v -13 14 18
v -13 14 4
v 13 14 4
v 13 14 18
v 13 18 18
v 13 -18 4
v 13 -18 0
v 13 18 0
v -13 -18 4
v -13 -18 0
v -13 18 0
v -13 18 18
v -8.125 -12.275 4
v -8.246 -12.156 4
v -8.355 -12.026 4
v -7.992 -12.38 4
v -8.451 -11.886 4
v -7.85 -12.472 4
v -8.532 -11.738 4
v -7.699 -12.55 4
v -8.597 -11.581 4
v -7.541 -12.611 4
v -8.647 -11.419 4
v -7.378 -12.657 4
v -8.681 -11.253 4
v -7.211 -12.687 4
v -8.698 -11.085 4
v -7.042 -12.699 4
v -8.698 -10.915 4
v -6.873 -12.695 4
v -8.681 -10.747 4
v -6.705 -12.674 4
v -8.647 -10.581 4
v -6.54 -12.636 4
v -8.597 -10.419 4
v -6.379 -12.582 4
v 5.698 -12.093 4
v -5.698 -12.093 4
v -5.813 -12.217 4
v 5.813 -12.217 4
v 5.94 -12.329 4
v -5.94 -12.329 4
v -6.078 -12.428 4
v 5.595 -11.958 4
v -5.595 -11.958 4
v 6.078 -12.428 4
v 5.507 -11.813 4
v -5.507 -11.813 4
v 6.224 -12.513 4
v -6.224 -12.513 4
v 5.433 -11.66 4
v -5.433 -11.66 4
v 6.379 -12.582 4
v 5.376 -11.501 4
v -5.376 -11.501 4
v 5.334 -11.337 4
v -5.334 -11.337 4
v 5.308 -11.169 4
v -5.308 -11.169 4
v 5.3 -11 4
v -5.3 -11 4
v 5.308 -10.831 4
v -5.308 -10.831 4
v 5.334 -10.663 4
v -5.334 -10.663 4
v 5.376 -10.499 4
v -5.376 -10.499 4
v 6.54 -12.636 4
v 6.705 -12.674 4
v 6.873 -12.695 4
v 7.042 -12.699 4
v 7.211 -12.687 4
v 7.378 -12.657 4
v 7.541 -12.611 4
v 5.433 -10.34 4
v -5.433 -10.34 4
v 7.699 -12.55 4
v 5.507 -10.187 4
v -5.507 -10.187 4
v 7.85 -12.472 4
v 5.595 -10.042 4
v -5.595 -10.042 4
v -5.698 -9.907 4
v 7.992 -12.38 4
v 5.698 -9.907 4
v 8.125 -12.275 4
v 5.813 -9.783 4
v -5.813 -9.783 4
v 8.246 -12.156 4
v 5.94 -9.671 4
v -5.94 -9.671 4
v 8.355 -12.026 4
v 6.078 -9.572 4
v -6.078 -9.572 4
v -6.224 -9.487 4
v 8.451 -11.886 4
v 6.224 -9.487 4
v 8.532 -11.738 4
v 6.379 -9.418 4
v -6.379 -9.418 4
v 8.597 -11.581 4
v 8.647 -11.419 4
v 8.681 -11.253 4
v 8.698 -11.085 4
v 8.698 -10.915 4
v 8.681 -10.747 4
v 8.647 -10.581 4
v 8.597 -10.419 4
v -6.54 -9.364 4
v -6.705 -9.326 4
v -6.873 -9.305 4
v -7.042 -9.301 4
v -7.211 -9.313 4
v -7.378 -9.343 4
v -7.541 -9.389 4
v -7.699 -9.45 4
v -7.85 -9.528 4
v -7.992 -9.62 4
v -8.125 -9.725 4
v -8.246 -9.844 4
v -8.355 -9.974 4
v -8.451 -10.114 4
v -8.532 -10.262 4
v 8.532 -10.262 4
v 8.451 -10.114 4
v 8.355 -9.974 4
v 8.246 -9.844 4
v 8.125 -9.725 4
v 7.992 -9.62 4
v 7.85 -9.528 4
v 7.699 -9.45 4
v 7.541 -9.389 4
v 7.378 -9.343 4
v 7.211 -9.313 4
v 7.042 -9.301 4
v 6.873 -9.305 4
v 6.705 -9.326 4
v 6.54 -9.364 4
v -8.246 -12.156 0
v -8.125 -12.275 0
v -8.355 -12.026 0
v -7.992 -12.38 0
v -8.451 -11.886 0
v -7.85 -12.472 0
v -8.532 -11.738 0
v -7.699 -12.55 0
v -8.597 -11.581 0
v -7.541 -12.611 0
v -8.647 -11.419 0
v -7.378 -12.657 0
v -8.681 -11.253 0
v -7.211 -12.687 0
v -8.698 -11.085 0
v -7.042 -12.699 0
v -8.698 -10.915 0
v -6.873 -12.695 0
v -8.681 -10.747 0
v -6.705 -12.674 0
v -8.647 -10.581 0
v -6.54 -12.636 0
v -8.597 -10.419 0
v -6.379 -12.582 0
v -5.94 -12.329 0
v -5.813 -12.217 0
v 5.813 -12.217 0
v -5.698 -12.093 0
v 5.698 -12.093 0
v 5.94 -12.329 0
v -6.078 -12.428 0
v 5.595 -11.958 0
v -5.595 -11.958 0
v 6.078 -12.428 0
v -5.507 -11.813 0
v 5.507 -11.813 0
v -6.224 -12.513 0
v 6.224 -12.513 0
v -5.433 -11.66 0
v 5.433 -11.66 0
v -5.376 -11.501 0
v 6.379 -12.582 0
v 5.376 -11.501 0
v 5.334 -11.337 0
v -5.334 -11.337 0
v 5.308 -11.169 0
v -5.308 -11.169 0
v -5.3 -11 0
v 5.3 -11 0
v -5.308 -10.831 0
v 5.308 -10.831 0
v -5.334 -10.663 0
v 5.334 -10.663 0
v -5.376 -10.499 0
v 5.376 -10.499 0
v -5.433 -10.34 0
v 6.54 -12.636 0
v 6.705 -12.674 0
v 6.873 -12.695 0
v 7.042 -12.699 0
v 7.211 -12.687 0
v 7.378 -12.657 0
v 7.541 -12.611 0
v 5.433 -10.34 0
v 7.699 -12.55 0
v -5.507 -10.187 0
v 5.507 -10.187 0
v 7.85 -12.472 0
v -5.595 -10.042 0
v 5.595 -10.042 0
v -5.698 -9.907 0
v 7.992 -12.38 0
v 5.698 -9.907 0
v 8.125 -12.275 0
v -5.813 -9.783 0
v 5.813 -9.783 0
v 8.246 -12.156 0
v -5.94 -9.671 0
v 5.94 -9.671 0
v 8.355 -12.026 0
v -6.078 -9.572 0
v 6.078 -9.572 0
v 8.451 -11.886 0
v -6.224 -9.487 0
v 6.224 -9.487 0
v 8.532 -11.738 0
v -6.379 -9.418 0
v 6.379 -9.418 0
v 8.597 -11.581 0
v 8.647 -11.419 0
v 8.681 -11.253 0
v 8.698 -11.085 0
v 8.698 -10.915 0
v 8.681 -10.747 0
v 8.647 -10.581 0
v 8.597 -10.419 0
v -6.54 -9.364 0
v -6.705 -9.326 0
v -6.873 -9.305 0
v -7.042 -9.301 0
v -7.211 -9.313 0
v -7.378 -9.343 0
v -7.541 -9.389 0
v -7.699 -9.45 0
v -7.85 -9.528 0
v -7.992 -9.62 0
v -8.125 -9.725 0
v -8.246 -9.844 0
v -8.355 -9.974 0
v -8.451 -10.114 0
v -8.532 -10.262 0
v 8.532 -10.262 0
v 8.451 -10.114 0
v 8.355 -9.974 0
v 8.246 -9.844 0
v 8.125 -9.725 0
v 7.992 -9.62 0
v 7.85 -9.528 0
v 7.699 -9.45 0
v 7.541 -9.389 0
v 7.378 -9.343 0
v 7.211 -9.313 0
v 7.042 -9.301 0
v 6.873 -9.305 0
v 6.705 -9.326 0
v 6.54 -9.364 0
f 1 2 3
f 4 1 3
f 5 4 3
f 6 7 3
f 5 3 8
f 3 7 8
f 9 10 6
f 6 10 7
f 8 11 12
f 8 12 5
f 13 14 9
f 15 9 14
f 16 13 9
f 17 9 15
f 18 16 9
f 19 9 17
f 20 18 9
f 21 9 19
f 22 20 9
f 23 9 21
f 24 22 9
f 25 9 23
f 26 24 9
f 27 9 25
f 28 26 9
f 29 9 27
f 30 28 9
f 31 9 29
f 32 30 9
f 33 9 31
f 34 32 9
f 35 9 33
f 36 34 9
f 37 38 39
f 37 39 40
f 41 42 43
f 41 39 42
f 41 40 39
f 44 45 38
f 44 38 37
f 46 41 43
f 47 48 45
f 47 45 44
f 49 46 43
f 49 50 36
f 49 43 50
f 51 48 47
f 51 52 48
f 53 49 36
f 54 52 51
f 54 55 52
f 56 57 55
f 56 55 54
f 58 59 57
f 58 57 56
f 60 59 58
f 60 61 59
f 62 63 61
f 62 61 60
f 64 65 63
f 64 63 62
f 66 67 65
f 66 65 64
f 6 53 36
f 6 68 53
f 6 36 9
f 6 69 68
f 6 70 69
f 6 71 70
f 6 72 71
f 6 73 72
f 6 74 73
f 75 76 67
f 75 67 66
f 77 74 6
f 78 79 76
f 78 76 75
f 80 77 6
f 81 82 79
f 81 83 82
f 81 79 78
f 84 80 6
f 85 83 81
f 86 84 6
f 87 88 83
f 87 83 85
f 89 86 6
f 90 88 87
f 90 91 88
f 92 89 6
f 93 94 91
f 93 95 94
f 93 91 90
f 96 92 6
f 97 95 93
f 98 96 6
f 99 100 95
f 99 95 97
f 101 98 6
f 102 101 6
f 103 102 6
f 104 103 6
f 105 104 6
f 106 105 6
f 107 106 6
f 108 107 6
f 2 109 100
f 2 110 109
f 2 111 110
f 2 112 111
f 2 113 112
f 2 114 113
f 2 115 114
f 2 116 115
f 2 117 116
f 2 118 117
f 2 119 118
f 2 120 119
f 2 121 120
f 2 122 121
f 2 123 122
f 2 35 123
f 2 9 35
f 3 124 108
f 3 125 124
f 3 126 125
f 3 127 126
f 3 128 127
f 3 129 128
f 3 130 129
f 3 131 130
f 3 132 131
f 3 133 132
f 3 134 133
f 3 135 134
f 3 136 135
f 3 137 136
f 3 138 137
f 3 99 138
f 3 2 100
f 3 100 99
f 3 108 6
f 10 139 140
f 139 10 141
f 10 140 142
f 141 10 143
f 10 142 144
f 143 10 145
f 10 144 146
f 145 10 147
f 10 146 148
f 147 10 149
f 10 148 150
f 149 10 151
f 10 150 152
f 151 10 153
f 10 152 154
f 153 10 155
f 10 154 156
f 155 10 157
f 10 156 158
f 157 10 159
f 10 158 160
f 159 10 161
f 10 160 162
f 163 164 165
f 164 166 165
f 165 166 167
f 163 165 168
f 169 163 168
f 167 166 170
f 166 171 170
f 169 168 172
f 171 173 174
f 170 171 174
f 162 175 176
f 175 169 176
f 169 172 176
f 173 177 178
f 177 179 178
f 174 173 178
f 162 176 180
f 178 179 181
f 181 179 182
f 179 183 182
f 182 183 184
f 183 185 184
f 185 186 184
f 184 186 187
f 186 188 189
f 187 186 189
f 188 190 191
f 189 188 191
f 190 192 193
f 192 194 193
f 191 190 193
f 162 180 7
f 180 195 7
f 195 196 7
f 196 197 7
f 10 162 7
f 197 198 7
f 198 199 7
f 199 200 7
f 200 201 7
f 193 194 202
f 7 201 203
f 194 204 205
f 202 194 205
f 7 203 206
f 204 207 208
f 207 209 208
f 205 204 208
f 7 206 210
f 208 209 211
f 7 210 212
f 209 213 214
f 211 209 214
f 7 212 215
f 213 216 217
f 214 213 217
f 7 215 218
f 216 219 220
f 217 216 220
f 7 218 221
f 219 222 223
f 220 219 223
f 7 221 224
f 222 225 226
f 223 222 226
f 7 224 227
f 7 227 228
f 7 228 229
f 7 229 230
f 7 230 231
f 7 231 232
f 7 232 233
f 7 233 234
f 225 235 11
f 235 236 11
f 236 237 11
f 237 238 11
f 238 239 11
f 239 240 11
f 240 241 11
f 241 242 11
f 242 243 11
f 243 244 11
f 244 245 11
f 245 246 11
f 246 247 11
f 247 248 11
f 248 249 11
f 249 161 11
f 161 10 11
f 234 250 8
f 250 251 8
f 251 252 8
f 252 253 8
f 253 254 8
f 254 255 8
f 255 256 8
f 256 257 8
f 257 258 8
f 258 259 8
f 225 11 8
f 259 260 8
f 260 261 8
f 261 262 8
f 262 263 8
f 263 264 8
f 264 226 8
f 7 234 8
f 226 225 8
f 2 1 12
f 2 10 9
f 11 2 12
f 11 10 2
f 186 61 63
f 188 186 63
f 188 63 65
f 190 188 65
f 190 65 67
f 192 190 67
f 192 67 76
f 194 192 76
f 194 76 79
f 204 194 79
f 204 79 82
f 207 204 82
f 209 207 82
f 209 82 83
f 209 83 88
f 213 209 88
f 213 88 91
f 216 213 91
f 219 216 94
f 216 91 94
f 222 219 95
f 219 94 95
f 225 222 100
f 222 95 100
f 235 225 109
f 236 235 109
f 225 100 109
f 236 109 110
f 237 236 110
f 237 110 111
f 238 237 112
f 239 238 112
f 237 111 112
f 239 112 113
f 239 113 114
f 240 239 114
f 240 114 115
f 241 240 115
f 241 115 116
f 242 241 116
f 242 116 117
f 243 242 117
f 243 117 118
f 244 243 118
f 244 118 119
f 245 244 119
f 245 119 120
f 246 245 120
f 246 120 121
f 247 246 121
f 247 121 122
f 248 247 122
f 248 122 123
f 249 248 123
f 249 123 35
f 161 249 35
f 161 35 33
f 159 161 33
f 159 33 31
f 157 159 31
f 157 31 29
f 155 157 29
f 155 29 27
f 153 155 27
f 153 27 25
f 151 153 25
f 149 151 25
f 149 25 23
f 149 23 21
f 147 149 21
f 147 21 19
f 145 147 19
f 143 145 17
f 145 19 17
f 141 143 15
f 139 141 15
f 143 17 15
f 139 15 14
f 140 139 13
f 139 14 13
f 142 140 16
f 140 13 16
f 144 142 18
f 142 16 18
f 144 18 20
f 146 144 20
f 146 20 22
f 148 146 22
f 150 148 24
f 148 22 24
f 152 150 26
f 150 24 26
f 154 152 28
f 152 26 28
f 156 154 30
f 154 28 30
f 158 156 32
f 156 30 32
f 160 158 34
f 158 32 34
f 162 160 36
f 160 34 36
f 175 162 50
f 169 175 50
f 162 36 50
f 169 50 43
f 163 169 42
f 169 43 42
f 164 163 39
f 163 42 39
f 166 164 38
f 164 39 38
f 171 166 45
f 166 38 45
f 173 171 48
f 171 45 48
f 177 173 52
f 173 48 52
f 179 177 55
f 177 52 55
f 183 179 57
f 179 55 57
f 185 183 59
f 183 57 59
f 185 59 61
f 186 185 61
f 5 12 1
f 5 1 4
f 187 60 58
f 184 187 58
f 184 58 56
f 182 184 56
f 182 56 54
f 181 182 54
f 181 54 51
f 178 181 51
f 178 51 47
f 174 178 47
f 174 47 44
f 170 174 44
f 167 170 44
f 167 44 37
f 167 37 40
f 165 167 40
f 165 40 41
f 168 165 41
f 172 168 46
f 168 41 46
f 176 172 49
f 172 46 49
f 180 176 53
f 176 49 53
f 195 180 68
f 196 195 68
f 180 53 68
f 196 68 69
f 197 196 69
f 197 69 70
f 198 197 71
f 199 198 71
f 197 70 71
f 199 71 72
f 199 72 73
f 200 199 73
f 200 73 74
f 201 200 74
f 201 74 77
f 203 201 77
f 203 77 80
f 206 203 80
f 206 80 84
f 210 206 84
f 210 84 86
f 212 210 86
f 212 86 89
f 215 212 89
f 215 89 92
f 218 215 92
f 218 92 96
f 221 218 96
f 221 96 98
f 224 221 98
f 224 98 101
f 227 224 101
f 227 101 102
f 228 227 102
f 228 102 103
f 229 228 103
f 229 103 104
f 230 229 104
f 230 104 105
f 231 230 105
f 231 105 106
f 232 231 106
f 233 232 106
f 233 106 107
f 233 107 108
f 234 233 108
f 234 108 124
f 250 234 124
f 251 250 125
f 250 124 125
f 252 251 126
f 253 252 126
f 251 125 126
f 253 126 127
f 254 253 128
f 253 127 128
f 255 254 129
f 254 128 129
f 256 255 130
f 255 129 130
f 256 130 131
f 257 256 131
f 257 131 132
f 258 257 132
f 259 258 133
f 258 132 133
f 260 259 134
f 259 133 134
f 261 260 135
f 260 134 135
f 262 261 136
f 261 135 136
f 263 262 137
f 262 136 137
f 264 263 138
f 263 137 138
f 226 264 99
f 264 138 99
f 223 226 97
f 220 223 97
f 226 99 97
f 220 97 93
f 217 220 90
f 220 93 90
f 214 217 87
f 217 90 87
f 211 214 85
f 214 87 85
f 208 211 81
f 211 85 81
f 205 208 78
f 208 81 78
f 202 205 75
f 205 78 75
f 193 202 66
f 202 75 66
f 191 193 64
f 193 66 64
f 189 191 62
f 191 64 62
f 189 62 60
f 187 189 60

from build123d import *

# Parameters (mm, degrees)
SKETCH_3_W          = 26
SKETCH_3_H          = 36
EXTRUDE_1_DEPTH     = 4
CUT_EXTRUDE_1_REACH = 24.561
SKETCH_4_R          = 1.7
SKETCH_5_W          = 26
SKETCH_5_H          = 4
EXTRUDE_2_DEPTH     = 14


with BuildPart() as part:
    # Эскиз3 → Бобышка-Вытянуть1 (new body)
    with BuildSketch(Plane.XY):
        Rectangle(SKETCH_3_W, SKETCH_3_H)
    extrude(amount=EXTRUDE_1_DEPTH)

    # Эскиз4 → Вырез-Вытянуть1 (cut, up to next)
    with BuildSketch(Plane.XY.offset(4), mode=Mode.PRIVATE) as cut_extrude_1_sk1:
        with Locations((-7, -11)):
            Circle(SKETCH_4_R)
    cut_extrude_1_tool1 = extrude(cut_extrude_1_sk1.sketch, amount=-CUT_EXTRUDE_1_REACH, mode=Mode.PRIVATE) & part.part
    # Эскиз4 → Вырез-Вытянуть1 (cut, up to next)
    with BuildSketch(Plane.XY.offset(4), mode=Mode.PRIVATE) as cut_extrude_1_sk2:
        with Locations(Location((7, -11, 0), (0, 0, 180))):
            Circle(SKETCH_4_R)
    cut_extrude_1_tool2 = extrude(cut_extrude_1_sk2.sketch, amount=-CUT_EXTRUDE_1_REACH, mode=Mode.PRIVATE) & part.part
    add(cut_extrude_1_tool1.solids().sort_by_distance((-7, -11, 4))[0], mode=Mode.SUBTRACT)
    add(cut_extrude_1_tool2.solids().sort_by_distance((7, -11, 4))[0], mode=Mode.SUBTRACT)

    # Эскиз5 → Бобышка-Вытянуть2 (add)
    with BuildSketch(Plane.XY.offset(4)):
        with Locations((0, 16)):
            Rectangle(SKETCH_5_W, SKETCH_5_H)
    extrude(amount=EXTRUDE_2_DEPTH)


solid = part.part
